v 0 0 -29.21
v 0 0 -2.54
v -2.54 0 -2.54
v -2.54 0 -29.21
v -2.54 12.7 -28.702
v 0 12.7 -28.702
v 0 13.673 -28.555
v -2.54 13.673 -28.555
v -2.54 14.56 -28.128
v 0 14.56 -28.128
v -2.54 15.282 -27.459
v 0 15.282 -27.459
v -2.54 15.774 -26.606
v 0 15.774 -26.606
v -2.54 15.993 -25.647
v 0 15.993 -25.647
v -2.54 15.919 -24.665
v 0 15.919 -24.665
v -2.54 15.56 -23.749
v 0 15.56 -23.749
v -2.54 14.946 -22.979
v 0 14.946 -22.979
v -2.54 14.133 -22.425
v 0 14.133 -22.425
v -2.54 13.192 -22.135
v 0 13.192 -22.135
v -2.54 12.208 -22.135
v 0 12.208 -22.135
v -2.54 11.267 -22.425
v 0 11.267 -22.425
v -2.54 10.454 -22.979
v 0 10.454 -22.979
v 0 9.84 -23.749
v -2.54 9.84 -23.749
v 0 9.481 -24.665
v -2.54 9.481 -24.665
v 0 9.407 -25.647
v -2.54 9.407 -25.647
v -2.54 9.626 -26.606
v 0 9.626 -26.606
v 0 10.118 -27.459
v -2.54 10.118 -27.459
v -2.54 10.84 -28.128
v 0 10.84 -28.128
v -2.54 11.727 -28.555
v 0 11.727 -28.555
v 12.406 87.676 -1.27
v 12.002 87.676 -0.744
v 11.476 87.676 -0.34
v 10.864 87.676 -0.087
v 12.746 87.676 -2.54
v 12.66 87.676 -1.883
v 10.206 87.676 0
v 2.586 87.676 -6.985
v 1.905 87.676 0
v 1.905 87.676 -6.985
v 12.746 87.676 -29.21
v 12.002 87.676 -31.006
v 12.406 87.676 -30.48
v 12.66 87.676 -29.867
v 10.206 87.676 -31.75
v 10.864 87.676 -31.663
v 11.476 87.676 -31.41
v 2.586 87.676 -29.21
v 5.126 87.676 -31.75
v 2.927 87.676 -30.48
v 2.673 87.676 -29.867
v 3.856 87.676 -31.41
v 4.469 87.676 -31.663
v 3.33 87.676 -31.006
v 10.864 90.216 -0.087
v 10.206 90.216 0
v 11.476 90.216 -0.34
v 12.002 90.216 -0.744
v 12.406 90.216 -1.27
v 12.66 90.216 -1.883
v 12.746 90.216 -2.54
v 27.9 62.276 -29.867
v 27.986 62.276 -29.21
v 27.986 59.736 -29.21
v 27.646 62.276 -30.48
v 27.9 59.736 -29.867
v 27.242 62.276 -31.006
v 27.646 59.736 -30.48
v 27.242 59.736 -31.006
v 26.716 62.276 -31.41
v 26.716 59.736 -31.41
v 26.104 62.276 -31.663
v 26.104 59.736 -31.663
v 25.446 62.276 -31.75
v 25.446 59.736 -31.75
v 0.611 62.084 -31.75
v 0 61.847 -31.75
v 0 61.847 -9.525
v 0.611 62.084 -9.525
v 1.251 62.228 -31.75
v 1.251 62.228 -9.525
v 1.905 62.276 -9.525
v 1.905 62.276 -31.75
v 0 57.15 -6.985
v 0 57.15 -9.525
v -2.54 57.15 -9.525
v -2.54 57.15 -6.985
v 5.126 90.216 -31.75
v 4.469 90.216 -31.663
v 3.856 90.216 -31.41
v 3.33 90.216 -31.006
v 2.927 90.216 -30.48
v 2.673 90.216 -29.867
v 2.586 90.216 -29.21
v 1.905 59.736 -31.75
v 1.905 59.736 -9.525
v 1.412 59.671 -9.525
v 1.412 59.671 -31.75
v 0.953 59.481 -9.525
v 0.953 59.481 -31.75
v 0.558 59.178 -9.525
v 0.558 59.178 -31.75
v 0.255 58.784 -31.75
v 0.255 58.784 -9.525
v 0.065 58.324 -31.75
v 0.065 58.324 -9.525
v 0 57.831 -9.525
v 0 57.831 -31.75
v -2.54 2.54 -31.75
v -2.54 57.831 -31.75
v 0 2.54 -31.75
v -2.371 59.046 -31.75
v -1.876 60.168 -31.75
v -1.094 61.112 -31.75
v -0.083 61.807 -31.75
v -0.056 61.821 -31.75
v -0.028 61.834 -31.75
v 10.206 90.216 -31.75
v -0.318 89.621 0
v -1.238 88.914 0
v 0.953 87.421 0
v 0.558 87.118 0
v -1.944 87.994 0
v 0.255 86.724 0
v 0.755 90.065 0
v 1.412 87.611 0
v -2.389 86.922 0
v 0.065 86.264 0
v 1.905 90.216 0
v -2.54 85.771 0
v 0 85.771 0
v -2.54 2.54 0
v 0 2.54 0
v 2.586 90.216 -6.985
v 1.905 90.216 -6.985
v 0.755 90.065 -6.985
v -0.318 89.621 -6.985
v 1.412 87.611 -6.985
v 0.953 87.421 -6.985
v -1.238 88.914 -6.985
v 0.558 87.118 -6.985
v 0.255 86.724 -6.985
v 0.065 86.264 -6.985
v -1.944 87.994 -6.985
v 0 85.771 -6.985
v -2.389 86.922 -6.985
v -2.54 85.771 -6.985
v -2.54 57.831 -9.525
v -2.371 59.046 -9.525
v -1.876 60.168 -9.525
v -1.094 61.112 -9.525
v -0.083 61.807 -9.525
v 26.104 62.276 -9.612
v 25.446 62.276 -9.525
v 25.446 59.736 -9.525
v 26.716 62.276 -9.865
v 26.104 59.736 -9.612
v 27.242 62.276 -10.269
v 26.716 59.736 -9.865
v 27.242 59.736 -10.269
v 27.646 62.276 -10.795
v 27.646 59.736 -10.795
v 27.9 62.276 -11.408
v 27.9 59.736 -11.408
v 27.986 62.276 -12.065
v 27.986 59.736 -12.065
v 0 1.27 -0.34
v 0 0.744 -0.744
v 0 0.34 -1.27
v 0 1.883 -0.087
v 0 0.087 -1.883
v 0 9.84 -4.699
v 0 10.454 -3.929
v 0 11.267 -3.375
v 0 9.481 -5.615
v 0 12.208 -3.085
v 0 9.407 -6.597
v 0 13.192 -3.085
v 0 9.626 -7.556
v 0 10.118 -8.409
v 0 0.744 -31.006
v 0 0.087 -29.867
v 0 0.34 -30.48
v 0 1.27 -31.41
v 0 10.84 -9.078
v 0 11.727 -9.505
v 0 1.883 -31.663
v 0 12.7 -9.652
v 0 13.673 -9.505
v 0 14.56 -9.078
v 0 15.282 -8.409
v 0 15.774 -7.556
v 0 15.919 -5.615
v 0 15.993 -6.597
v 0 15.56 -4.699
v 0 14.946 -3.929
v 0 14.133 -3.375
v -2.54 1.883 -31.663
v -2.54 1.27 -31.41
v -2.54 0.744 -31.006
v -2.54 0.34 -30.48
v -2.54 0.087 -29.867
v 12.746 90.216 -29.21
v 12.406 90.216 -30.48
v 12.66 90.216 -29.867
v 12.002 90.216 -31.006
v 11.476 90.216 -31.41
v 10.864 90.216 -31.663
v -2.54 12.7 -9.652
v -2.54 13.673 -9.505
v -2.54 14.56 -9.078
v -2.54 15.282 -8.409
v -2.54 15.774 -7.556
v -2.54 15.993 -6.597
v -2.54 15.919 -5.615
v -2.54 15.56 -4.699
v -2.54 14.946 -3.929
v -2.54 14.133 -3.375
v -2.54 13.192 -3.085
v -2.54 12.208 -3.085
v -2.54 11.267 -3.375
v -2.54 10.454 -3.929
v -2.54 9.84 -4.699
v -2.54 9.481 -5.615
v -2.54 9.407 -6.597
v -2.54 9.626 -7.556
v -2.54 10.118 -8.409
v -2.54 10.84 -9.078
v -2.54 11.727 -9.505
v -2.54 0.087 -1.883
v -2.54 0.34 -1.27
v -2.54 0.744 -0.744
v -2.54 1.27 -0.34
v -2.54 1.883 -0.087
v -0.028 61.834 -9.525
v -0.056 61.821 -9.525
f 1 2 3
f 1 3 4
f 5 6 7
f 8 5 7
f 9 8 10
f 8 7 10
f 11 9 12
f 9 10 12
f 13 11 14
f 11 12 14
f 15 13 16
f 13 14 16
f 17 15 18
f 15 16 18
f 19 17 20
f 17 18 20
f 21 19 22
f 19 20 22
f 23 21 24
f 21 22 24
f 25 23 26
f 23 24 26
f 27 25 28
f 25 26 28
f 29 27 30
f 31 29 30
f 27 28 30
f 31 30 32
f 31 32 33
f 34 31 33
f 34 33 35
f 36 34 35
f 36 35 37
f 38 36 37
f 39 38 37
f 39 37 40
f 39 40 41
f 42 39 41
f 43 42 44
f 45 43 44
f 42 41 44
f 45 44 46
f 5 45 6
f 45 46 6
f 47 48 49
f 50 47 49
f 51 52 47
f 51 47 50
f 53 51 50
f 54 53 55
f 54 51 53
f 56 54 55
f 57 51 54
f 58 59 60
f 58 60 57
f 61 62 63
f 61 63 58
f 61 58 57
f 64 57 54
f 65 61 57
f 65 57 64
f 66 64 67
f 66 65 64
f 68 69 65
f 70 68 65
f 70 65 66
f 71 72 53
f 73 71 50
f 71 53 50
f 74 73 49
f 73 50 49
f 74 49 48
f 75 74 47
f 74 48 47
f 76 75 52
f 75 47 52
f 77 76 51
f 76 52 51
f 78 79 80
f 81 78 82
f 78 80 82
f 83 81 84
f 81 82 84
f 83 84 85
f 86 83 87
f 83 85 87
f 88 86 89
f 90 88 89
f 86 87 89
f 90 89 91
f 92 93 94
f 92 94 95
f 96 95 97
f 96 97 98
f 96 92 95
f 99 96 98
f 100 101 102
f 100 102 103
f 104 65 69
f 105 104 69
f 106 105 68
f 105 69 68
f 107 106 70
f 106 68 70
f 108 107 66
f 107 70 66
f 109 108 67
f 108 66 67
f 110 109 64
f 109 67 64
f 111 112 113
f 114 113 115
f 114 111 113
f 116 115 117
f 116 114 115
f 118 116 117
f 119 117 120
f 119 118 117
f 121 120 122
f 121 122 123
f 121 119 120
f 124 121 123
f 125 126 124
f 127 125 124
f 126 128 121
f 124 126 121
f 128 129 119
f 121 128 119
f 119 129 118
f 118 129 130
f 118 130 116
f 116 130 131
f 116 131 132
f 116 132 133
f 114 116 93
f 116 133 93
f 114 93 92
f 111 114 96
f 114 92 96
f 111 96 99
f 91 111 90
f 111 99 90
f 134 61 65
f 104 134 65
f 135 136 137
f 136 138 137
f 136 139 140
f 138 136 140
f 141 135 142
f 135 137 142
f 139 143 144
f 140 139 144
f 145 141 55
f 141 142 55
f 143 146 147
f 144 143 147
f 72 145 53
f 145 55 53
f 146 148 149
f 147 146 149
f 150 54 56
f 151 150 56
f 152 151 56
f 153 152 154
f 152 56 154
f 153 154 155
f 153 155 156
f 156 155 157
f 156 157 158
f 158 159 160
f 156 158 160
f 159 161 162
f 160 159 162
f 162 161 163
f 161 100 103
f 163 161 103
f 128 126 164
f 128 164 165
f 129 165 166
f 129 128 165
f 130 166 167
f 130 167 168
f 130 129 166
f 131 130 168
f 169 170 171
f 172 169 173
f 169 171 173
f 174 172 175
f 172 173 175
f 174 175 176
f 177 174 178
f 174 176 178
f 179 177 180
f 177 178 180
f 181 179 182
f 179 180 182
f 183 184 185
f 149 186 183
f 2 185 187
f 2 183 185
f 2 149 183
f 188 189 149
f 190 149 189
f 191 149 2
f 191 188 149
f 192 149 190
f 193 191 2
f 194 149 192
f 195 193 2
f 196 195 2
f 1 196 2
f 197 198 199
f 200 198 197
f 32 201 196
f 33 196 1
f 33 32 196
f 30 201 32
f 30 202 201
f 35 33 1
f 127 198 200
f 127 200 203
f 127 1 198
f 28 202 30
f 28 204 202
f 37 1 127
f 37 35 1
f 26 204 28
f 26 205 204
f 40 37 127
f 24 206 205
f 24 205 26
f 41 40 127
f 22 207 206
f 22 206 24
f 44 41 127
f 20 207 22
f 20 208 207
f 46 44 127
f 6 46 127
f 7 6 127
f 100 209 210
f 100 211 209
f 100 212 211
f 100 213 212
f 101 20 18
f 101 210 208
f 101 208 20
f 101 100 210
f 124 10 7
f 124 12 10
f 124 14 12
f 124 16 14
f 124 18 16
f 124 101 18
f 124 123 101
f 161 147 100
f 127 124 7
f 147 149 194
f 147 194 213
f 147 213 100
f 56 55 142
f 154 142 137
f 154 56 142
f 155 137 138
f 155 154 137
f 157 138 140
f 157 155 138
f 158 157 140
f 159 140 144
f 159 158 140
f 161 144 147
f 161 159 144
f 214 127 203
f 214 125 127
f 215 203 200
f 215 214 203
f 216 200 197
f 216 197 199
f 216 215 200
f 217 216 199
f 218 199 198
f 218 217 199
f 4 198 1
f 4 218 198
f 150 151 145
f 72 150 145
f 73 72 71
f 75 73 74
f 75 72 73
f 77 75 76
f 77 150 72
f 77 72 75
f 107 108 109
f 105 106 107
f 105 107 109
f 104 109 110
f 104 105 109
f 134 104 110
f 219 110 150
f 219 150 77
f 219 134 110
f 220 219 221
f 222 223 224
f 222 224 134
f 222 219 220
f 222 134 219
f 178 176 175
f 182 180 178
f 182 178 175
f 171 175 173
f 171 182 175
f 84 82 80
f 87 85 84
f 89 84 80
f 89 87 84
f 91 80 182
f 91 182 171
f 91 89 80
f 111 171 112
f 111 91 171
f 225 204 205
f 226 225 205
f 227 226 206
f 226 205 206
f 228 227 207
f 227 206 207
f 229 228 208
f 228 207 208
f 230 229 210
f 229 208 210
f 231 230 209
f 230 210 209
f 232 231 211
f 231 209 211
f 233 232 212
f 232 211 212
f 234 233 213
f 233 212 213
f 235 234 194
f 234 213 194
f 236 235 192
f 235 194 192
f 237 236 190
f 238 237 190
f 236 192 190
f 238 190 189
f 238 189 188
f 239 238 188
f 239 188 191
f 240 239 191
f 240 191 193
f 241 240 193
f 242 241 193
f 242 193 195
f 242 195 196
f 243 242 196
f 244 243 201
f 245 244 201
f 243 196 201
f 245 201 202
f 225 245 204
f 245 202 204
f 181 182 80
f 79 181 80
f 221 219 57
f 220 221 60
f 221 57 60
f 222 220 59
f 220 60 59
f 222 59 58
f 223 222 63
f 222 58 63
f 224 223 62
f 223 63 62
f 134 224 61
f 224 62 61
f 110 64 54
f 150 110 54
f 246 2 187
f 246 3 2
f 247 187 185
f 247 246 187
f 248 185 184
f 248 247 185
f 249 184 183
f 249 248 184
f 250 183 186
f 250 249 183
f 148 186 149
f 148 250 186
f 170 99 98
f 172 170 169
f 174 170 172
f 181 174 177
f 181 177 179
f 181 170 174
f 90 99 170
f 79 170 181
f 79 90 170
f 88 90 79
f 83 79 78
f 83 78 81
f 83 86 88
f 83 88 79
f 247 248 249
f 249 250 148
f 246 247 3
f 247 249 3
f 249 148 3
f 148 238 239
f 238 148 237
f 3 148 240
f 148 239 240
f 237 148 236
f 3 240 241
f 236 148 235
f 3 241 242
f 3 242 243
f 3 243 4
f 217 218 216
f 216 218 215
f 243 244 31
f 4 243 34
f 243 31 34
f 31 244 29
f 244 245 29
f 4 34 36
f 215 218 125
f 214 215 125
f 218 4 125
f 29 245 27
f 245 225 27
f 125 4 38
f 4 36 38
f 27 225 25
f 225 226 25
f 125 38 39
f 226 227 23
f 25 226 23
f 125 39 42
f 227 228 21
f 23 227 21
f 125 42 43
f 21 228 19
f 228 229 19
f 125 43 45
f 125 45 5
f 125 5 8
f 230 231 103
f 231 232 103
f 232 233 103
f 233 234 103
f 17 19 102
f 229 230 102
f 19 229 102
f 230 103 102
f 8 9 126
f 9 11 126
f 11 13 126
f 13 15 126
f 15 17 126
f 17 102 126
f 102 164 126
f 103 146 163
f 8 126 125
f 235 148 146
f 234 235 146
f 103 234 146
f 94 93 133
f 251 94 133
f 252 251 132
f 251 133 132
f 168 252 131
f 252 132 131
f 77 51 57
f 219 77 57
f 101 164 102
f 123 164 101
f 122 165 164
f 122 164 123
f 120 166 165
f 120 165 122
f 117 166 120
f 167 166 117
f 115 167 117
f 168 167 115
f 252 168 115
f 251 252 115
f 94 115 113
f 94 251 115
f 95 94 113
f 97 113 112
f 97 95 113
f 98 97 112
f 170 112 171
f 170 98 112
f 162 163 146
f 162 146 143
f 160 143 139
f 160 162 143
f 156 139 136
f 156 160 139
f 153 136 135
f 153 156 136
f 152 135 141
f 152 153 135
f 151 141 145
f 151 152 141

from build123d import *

# Parameters (mm, degrees)
SKETCH1_W                  = 31.75
SKETCH1_H                  = 101.6
BASE_FLANGE1_DEPTH         = 2.54
CUT_EXTRUDE1_DEPTH         = 107.475697227
FILLET1_R                  = 2.54
FILLET2_R                  = 2.54
SKETCH7_R                  = 3.302
CUT_EXTRUDE2_DEPTH         = 2.54
SKETCHED_START             = 61.806879931
SKETCHED_BEND7_OUTLINE_W   = 2.54
SKETCHED_BEND7_OUTLINE_H   = 22.225
SKETCHED_BEND7_DEPTH       = 27.093120069
SKETCHED_START_2           = 59.736360831
SKETCHED_BEND7_2_DEPTH     = 2.0705191
SKETCHED_START_3           = 57.831360831
SKETCHED_BEND7_3_DEPTH     = 4.445
SKETCHED_START_4           = -33
SKETCHED_BEND7_4_DEPTH     = 23.475
SKETCHED_START_5           = -31.75
SKETCHED_BEND7_5_DEPTH     = 22.225
SKETCHED_START_6           = 90.216360831
SKETCHED_BEND8_OUTLINE_W   = 2.54
SKETCHED_BEND8_OUTLINE_H   = 31.75
SKETCHED_BEND8_DEPTH       = 11.383639169
SKETCHED_START_7           = 87.676360831
SKETCHED_BEND8_2_DEPTH     = 2.0705191
SKETCHED_START_8           = 89.948086031
SKETCHED_BEND8_3_OUTLINE_W = 2.54
SKETCHED_BEND8_3_OUTLINE_H = 6.985
SKETCHED_BEND8_3_DEPTH     = 0.2682748
SKETCHED_START_9           = 85.771360831
SKETCHED_BEND8_4_DEPTH     = 4.445
SKETCHED_BEND8_5_DEPTH     = 31.75


with BuildPart() as part:
    # Base-Flange1: sheet metal written as solids
    # Sketch1 → Base-Flange1 (new body)
    with BuildSketch(Plane(origin=(0, 0, 0), x_dir=(0, 0, -1), z_dir=(1, 0, 0))):
        with Locations((15.875, 50.8)):
            Rectangle(SKETCH1_W, SKETCH1_H)
    extrude(amount=-BASE_FLANGE1_DEPTH)

    # Sketch6 → Cut-Extrude1 (cut, through all)
    with BuildSketch(Plane(origin=(0, 0, 0), x_dir=(0, 0, -1), z_dir=(1, 0, 0))):
        with BuildLine():
            Line((31.75, 88.9), (12.065, 88.9))
            ThreePointArc((12.065, 88.9), (10.268948776, 88.156051224), (9.525, 86.36))
            Line((9.525, 86.36), (9.525, 57.15))
            Line((9.525, 57.15), (6.985, 57.15))
            Line((6.985, 57.15), (6.985, 91.44))
            Line((6.985, 91.44), (31.75, 91.44))
            Line((31.75, 91.44), (31.75, 88.9))
        make_face()
    extrude(amount=-CUT_EXTRUDE1_DEPTH, mode=Mode.SUBTRACT)

    # Fillet1
    fillet1_edges = [part.edges().sort_by_distance(p)[0] for p in [
        (-1.27, 88.9, -31.75),
    ]]
    fillet(fillet1_edges, radius=FILLET1_R)

    # Fillet2
    fillet2_edges = [part.edges().sort_by_distance(p)[0] for p in [
        (-1.27, 91.44, -31.75),
        (-1.27, 101.6, 0),
        (-1.27, 101.6, -31.75),
        (-1.27, 0, -31.75),
        (-1.27, 0, 0),
    ]]
    fillet(fillet2_edges, radius=FILLET2_R)

    # Sketch7 → Cut-Extrude2 (cut)
    with BuildSketch(Plane(origin=(0, 0, 0), x_dir=(0, 0, -1), z_dir=(1, 0, 0))):
        with Locations((6.35, 12.7)):
            Circle(SKETCH7_R)
        with Locations((25.4, 12.7)):
            Circle(SKETCH7_R)
    extrude(amount=-CUT_EXTRUDE2_DEPTH, mode=Mode.SUBTRACT)

    # Sketched Bend7: read off the stored shape, not the designer's step
    # Sketched Bend7 outline → Sketched Bend7 (cut)
    with BuildSketch(Plane(origin=(0, 0, 0), x_dir=(1, 0, 0), z_dir=(0, 1, 0)).offset(SKETCHED_START)):
        with Locations((-1.27, 20.6375)):
            Rectangle(SKETCHED_BEND7_OUTLINE_W, SKETCHED_BEND7_OUTLINE_H)
    extrude(amount=SKETCHED_BEND7_DEPTH, mode=Mode.SUBTRACT)

    # Sketched Bend7 2 outline → Sketched Bend7 2 (add)
    with BuildSketch(Plane(origin=(0, 0, 0), x_dir=(1, 0, 0), z_dir=(0, 1, 0)).offset(SKETCHED_START_2)):
        with BuildLine():
            Line((0, 9.525), (25.446360831, 9.525))
            ThreePointArc((25.446360831, 9.525), (27.242412055, 10.268948776), (27.986360831, 12.065))
            Line((27.986360831, 12.065), (27.986360831, 29.21))
            ThreePointArc((27.986360831, 29.21), (27.242412055, 31.006051224), (25.446360831, 31.75))
            Line((25.446360831, 31.75), (0, 31.75))
            Line((0, 31.75), (0, 9.525))
        make_face()
    extrude(amount=SKETCHED_BEND7_2_DEPTH)

    # Sketched Bend7 3 outline → Sketched Bend7 3 (add)
    with BuildSketch(Plane(origin=(0, 0, 0), x_dir=(1, 0, 0), z_dir=(0, 1, 0)).offset(SKETCHED_START_3)):
        with BuildLine():
            Line((0, 9.525), (25.446360831, 9.525))
            ThreePointArc((25.446360831, 9.525), (27.242412055, 10.268948776), (27.986360831, 12.065))
            Line((27.986360831, 12.065), (27.986360831, 29.21))
            ThreePointArc((27.986360831, 29.21), (27.242412055, 31.006051224), (25.446360831, 31.75))
            Line((25.446360831, 31.75), (0, 31.75))
            Line((0, 31.75), (0, 9.525))
        make_face()
    extrude(amount=SKETCHED_BEND7_3_DEPTH)

    # Sketched Bend7 4 outline → Sketched Bend7 4 (cut)
    with BuildSketch(Plane.XY.offset(SKETCHED_START_4)):
        with BuildLine():
            Line((27.986360831, 57.831360831), (27.986360831, 59.736360831))
            Line((27.986360831, 59.736360831), (1.905, 59.736360831))
            ThreePointArc((1.905, 59.736360831), (0.557961582, 59.178399249), (0, 57.831360831))
            Line((0, 57.831360831), (27.986360831, 57.831360831))
        make_face()
        with BuildLine():
            ThreePointArc((-2.54, 57.831360831), (-1.876266121, 60.168036145), (-0.083283905, 61.806879931))
            Line((-0.083283905, 61.806879931), (-2.54, 61.806879931))
            Line((-2.54, 61.806879931), (-2.54, 57.831360831))
        make_face()
        with BuildLine():
            ThreePointArc((0, 61.84745346), (0.928656498, 62.167808498), (1.905, 62.276360831))
            Line((1.905, 62.276360831), (0, 62.276360831))
            Line((0, 62.276360831), (0, 61.84745346))
        make_face()
    extrude(amount=SKETCHED_BEND7_4_DEPTH, mode=Mode.SUBTRACT)

    # Sketched Bend7 5 outline → Sketched Bend7 5 (add)
    with BuildSketch(Plane.XY.offset(SKETCHED_START_5)):
        with BuildLine():
            Line((0, 61.806879931), (0, 61.84745346))
            ThreePointArc((0, 61.84745346), (-0.041747658, 61.827383673), (-0.083283905, 61.806879931))
            Line((-0.083283905, 61.806879931), (0, 61.806879931))
        make_face()
    extrude(amount=SKETCHED_BEND7_5_DEPTH)

    # Sketched Bend8: read off the stored shape, not the designer's step
    # Sketched Bend8 outline → Sketched Bend8 (cut)
    with BuildSketch(Plane(origin=(0, 0, 0), x_dir=(1, 0, 0), z_dir=(0, 1, 0)).offset(SKETCHED_START_6)):
        with Locations((-1.27, 15.875)):
            Rectangle(SKETCHED_BEND8_OUTLINE_W, SKETCHED_BEND8_OUTLINE_H)
    extrude(amount=SKETCHED_BEND8_DEPTH, mode=Mode.SUBTRACT)

    # Sketched Bend8 2 outline → Sketched Bend8 2 (add)
    with BuildSketch(Plane(origin=(0, 0, 0), x_dir=(1, 0, 0), z_dir=(0, 1, 0)).offset(SKETCHED_START_7)):
        with BuildLine():
            Line((0, 6.985), (0, 0))
            Line((0, 0), (10.206360831, 0))
            ThreePointArc((10.206360831, 0), (12.002412055, 0.743948776), (12.746360831, 2.54))
            Line((12.746360831, 2.54), (12.746360831, 29.21))
            ThreePointArc((12.746360831, 29.21), (12.002412055, 31.006051224), (10.206360831, 31.75))
            Line((10.206360831, 31.75), (5.126360831, 31.75))
            ThreePointArc((5.126360831, 31.75), (3.330309607, 31.006051224), (2.586360831, 29.21))
            Line((2.586360831, 29.21), (2.586360831, 6.985))
            Line((2.586360831, 6.985), (0, 6.985))
        make_face()
    extrude(amount=SKETCHED_BEND8_2_DEPTH)

    # Sketched Bend8 3 outline → Sketched Bend8 3 (cut)
    with BuildSketch(Plane(origin=(0, 0, 0), x_dir=(1, 0, 0), z_dir=(0, 1, 0)).offset(SKETCHED_START_8)):
        with Locations((-1.27, 3.4925)):
            Rectangle(SKETCHED_BEND8_3_OUTLINE_W, SKETCHED_BEND8_3_OUTLINE_H)
    extrude(amount=SKETCHED_BEND8_3_DEPTH, mode=Mode.SUBTRACT)

    # Sketched Bend8 4 outline → Sketched Bend8 4 (add)
    with BuildSketch(Plane(origin=(0, 0, 0), x_dir=(1, 0, 0), z_dir=(0, 1, 0)).offset(SKETCHED_START_9)):
        with BuildLine():
            Line((0, 0), (10.206360831, 0))
            ThreePointArc((10.206360831, 0), (12.002412055, 0.743948776), (12.746360831, 2.54))
            Line((12.746360831, 2.54), (12.746360831, 29.21))
            ThreePointArc((12.746360831, 29.21), (12.002412055, 31.006051224), (10.206360831, 31.75))
            Line((10.206360831, 31.75), (5.126360831, 31.75))
            ThreePointArc((5.126360831, 31.75), (3.330309607, 31.006051224), (2.586360831, 29.21))
            Line((2.586360831, 29.21), (2.586360831, 6.985))
            Line((2.586360831, 6.985), (0, 6.985))
            Line((0, 6.985), (0, 0))
        make_face()
    extrude(amount=SKETCHED_BEND8_4_DEPTH)

    # Sketched Bend8 5 outline → Sketched Bend8 5 (cut)
    with BuildSketch(Plane.XY.offset(SKETCHED_START_5)):
        with BuildLine():
            Line((-2.54, 89.948086031), (-2.54, 85.771360831))
            ThreePointArc((-2.54, 85.771360831), (-1.238089643, 88.914450473), (1.905, 90.216360831))
            Line((1.905, 90.216360831), (0, 90.216360831))
            Line((0, 90.216360831), (0, 89.948086031))
            Line((0, 89.948086031), (-2.54, 89.948086031))
        make_face()
        with BuildLine():
            Line((0, 85.771360831), (12.746360831, 85.771360831))
            Line((12.746360831, 85.771360831), (12.746360831, 87.676360831))
            Line((12.746360831, 87.676360831), (1.905, 87.676360831))
            ThreePointArc((1.905, 87.676360831), (0.557961582, 87.118399249), (0, 85.771360831))
        make_face()
    extrude(amount=SKETCHED_BEND8_5_DEPTH, mode=Mode.SUBTRACT)


solid = part.part
